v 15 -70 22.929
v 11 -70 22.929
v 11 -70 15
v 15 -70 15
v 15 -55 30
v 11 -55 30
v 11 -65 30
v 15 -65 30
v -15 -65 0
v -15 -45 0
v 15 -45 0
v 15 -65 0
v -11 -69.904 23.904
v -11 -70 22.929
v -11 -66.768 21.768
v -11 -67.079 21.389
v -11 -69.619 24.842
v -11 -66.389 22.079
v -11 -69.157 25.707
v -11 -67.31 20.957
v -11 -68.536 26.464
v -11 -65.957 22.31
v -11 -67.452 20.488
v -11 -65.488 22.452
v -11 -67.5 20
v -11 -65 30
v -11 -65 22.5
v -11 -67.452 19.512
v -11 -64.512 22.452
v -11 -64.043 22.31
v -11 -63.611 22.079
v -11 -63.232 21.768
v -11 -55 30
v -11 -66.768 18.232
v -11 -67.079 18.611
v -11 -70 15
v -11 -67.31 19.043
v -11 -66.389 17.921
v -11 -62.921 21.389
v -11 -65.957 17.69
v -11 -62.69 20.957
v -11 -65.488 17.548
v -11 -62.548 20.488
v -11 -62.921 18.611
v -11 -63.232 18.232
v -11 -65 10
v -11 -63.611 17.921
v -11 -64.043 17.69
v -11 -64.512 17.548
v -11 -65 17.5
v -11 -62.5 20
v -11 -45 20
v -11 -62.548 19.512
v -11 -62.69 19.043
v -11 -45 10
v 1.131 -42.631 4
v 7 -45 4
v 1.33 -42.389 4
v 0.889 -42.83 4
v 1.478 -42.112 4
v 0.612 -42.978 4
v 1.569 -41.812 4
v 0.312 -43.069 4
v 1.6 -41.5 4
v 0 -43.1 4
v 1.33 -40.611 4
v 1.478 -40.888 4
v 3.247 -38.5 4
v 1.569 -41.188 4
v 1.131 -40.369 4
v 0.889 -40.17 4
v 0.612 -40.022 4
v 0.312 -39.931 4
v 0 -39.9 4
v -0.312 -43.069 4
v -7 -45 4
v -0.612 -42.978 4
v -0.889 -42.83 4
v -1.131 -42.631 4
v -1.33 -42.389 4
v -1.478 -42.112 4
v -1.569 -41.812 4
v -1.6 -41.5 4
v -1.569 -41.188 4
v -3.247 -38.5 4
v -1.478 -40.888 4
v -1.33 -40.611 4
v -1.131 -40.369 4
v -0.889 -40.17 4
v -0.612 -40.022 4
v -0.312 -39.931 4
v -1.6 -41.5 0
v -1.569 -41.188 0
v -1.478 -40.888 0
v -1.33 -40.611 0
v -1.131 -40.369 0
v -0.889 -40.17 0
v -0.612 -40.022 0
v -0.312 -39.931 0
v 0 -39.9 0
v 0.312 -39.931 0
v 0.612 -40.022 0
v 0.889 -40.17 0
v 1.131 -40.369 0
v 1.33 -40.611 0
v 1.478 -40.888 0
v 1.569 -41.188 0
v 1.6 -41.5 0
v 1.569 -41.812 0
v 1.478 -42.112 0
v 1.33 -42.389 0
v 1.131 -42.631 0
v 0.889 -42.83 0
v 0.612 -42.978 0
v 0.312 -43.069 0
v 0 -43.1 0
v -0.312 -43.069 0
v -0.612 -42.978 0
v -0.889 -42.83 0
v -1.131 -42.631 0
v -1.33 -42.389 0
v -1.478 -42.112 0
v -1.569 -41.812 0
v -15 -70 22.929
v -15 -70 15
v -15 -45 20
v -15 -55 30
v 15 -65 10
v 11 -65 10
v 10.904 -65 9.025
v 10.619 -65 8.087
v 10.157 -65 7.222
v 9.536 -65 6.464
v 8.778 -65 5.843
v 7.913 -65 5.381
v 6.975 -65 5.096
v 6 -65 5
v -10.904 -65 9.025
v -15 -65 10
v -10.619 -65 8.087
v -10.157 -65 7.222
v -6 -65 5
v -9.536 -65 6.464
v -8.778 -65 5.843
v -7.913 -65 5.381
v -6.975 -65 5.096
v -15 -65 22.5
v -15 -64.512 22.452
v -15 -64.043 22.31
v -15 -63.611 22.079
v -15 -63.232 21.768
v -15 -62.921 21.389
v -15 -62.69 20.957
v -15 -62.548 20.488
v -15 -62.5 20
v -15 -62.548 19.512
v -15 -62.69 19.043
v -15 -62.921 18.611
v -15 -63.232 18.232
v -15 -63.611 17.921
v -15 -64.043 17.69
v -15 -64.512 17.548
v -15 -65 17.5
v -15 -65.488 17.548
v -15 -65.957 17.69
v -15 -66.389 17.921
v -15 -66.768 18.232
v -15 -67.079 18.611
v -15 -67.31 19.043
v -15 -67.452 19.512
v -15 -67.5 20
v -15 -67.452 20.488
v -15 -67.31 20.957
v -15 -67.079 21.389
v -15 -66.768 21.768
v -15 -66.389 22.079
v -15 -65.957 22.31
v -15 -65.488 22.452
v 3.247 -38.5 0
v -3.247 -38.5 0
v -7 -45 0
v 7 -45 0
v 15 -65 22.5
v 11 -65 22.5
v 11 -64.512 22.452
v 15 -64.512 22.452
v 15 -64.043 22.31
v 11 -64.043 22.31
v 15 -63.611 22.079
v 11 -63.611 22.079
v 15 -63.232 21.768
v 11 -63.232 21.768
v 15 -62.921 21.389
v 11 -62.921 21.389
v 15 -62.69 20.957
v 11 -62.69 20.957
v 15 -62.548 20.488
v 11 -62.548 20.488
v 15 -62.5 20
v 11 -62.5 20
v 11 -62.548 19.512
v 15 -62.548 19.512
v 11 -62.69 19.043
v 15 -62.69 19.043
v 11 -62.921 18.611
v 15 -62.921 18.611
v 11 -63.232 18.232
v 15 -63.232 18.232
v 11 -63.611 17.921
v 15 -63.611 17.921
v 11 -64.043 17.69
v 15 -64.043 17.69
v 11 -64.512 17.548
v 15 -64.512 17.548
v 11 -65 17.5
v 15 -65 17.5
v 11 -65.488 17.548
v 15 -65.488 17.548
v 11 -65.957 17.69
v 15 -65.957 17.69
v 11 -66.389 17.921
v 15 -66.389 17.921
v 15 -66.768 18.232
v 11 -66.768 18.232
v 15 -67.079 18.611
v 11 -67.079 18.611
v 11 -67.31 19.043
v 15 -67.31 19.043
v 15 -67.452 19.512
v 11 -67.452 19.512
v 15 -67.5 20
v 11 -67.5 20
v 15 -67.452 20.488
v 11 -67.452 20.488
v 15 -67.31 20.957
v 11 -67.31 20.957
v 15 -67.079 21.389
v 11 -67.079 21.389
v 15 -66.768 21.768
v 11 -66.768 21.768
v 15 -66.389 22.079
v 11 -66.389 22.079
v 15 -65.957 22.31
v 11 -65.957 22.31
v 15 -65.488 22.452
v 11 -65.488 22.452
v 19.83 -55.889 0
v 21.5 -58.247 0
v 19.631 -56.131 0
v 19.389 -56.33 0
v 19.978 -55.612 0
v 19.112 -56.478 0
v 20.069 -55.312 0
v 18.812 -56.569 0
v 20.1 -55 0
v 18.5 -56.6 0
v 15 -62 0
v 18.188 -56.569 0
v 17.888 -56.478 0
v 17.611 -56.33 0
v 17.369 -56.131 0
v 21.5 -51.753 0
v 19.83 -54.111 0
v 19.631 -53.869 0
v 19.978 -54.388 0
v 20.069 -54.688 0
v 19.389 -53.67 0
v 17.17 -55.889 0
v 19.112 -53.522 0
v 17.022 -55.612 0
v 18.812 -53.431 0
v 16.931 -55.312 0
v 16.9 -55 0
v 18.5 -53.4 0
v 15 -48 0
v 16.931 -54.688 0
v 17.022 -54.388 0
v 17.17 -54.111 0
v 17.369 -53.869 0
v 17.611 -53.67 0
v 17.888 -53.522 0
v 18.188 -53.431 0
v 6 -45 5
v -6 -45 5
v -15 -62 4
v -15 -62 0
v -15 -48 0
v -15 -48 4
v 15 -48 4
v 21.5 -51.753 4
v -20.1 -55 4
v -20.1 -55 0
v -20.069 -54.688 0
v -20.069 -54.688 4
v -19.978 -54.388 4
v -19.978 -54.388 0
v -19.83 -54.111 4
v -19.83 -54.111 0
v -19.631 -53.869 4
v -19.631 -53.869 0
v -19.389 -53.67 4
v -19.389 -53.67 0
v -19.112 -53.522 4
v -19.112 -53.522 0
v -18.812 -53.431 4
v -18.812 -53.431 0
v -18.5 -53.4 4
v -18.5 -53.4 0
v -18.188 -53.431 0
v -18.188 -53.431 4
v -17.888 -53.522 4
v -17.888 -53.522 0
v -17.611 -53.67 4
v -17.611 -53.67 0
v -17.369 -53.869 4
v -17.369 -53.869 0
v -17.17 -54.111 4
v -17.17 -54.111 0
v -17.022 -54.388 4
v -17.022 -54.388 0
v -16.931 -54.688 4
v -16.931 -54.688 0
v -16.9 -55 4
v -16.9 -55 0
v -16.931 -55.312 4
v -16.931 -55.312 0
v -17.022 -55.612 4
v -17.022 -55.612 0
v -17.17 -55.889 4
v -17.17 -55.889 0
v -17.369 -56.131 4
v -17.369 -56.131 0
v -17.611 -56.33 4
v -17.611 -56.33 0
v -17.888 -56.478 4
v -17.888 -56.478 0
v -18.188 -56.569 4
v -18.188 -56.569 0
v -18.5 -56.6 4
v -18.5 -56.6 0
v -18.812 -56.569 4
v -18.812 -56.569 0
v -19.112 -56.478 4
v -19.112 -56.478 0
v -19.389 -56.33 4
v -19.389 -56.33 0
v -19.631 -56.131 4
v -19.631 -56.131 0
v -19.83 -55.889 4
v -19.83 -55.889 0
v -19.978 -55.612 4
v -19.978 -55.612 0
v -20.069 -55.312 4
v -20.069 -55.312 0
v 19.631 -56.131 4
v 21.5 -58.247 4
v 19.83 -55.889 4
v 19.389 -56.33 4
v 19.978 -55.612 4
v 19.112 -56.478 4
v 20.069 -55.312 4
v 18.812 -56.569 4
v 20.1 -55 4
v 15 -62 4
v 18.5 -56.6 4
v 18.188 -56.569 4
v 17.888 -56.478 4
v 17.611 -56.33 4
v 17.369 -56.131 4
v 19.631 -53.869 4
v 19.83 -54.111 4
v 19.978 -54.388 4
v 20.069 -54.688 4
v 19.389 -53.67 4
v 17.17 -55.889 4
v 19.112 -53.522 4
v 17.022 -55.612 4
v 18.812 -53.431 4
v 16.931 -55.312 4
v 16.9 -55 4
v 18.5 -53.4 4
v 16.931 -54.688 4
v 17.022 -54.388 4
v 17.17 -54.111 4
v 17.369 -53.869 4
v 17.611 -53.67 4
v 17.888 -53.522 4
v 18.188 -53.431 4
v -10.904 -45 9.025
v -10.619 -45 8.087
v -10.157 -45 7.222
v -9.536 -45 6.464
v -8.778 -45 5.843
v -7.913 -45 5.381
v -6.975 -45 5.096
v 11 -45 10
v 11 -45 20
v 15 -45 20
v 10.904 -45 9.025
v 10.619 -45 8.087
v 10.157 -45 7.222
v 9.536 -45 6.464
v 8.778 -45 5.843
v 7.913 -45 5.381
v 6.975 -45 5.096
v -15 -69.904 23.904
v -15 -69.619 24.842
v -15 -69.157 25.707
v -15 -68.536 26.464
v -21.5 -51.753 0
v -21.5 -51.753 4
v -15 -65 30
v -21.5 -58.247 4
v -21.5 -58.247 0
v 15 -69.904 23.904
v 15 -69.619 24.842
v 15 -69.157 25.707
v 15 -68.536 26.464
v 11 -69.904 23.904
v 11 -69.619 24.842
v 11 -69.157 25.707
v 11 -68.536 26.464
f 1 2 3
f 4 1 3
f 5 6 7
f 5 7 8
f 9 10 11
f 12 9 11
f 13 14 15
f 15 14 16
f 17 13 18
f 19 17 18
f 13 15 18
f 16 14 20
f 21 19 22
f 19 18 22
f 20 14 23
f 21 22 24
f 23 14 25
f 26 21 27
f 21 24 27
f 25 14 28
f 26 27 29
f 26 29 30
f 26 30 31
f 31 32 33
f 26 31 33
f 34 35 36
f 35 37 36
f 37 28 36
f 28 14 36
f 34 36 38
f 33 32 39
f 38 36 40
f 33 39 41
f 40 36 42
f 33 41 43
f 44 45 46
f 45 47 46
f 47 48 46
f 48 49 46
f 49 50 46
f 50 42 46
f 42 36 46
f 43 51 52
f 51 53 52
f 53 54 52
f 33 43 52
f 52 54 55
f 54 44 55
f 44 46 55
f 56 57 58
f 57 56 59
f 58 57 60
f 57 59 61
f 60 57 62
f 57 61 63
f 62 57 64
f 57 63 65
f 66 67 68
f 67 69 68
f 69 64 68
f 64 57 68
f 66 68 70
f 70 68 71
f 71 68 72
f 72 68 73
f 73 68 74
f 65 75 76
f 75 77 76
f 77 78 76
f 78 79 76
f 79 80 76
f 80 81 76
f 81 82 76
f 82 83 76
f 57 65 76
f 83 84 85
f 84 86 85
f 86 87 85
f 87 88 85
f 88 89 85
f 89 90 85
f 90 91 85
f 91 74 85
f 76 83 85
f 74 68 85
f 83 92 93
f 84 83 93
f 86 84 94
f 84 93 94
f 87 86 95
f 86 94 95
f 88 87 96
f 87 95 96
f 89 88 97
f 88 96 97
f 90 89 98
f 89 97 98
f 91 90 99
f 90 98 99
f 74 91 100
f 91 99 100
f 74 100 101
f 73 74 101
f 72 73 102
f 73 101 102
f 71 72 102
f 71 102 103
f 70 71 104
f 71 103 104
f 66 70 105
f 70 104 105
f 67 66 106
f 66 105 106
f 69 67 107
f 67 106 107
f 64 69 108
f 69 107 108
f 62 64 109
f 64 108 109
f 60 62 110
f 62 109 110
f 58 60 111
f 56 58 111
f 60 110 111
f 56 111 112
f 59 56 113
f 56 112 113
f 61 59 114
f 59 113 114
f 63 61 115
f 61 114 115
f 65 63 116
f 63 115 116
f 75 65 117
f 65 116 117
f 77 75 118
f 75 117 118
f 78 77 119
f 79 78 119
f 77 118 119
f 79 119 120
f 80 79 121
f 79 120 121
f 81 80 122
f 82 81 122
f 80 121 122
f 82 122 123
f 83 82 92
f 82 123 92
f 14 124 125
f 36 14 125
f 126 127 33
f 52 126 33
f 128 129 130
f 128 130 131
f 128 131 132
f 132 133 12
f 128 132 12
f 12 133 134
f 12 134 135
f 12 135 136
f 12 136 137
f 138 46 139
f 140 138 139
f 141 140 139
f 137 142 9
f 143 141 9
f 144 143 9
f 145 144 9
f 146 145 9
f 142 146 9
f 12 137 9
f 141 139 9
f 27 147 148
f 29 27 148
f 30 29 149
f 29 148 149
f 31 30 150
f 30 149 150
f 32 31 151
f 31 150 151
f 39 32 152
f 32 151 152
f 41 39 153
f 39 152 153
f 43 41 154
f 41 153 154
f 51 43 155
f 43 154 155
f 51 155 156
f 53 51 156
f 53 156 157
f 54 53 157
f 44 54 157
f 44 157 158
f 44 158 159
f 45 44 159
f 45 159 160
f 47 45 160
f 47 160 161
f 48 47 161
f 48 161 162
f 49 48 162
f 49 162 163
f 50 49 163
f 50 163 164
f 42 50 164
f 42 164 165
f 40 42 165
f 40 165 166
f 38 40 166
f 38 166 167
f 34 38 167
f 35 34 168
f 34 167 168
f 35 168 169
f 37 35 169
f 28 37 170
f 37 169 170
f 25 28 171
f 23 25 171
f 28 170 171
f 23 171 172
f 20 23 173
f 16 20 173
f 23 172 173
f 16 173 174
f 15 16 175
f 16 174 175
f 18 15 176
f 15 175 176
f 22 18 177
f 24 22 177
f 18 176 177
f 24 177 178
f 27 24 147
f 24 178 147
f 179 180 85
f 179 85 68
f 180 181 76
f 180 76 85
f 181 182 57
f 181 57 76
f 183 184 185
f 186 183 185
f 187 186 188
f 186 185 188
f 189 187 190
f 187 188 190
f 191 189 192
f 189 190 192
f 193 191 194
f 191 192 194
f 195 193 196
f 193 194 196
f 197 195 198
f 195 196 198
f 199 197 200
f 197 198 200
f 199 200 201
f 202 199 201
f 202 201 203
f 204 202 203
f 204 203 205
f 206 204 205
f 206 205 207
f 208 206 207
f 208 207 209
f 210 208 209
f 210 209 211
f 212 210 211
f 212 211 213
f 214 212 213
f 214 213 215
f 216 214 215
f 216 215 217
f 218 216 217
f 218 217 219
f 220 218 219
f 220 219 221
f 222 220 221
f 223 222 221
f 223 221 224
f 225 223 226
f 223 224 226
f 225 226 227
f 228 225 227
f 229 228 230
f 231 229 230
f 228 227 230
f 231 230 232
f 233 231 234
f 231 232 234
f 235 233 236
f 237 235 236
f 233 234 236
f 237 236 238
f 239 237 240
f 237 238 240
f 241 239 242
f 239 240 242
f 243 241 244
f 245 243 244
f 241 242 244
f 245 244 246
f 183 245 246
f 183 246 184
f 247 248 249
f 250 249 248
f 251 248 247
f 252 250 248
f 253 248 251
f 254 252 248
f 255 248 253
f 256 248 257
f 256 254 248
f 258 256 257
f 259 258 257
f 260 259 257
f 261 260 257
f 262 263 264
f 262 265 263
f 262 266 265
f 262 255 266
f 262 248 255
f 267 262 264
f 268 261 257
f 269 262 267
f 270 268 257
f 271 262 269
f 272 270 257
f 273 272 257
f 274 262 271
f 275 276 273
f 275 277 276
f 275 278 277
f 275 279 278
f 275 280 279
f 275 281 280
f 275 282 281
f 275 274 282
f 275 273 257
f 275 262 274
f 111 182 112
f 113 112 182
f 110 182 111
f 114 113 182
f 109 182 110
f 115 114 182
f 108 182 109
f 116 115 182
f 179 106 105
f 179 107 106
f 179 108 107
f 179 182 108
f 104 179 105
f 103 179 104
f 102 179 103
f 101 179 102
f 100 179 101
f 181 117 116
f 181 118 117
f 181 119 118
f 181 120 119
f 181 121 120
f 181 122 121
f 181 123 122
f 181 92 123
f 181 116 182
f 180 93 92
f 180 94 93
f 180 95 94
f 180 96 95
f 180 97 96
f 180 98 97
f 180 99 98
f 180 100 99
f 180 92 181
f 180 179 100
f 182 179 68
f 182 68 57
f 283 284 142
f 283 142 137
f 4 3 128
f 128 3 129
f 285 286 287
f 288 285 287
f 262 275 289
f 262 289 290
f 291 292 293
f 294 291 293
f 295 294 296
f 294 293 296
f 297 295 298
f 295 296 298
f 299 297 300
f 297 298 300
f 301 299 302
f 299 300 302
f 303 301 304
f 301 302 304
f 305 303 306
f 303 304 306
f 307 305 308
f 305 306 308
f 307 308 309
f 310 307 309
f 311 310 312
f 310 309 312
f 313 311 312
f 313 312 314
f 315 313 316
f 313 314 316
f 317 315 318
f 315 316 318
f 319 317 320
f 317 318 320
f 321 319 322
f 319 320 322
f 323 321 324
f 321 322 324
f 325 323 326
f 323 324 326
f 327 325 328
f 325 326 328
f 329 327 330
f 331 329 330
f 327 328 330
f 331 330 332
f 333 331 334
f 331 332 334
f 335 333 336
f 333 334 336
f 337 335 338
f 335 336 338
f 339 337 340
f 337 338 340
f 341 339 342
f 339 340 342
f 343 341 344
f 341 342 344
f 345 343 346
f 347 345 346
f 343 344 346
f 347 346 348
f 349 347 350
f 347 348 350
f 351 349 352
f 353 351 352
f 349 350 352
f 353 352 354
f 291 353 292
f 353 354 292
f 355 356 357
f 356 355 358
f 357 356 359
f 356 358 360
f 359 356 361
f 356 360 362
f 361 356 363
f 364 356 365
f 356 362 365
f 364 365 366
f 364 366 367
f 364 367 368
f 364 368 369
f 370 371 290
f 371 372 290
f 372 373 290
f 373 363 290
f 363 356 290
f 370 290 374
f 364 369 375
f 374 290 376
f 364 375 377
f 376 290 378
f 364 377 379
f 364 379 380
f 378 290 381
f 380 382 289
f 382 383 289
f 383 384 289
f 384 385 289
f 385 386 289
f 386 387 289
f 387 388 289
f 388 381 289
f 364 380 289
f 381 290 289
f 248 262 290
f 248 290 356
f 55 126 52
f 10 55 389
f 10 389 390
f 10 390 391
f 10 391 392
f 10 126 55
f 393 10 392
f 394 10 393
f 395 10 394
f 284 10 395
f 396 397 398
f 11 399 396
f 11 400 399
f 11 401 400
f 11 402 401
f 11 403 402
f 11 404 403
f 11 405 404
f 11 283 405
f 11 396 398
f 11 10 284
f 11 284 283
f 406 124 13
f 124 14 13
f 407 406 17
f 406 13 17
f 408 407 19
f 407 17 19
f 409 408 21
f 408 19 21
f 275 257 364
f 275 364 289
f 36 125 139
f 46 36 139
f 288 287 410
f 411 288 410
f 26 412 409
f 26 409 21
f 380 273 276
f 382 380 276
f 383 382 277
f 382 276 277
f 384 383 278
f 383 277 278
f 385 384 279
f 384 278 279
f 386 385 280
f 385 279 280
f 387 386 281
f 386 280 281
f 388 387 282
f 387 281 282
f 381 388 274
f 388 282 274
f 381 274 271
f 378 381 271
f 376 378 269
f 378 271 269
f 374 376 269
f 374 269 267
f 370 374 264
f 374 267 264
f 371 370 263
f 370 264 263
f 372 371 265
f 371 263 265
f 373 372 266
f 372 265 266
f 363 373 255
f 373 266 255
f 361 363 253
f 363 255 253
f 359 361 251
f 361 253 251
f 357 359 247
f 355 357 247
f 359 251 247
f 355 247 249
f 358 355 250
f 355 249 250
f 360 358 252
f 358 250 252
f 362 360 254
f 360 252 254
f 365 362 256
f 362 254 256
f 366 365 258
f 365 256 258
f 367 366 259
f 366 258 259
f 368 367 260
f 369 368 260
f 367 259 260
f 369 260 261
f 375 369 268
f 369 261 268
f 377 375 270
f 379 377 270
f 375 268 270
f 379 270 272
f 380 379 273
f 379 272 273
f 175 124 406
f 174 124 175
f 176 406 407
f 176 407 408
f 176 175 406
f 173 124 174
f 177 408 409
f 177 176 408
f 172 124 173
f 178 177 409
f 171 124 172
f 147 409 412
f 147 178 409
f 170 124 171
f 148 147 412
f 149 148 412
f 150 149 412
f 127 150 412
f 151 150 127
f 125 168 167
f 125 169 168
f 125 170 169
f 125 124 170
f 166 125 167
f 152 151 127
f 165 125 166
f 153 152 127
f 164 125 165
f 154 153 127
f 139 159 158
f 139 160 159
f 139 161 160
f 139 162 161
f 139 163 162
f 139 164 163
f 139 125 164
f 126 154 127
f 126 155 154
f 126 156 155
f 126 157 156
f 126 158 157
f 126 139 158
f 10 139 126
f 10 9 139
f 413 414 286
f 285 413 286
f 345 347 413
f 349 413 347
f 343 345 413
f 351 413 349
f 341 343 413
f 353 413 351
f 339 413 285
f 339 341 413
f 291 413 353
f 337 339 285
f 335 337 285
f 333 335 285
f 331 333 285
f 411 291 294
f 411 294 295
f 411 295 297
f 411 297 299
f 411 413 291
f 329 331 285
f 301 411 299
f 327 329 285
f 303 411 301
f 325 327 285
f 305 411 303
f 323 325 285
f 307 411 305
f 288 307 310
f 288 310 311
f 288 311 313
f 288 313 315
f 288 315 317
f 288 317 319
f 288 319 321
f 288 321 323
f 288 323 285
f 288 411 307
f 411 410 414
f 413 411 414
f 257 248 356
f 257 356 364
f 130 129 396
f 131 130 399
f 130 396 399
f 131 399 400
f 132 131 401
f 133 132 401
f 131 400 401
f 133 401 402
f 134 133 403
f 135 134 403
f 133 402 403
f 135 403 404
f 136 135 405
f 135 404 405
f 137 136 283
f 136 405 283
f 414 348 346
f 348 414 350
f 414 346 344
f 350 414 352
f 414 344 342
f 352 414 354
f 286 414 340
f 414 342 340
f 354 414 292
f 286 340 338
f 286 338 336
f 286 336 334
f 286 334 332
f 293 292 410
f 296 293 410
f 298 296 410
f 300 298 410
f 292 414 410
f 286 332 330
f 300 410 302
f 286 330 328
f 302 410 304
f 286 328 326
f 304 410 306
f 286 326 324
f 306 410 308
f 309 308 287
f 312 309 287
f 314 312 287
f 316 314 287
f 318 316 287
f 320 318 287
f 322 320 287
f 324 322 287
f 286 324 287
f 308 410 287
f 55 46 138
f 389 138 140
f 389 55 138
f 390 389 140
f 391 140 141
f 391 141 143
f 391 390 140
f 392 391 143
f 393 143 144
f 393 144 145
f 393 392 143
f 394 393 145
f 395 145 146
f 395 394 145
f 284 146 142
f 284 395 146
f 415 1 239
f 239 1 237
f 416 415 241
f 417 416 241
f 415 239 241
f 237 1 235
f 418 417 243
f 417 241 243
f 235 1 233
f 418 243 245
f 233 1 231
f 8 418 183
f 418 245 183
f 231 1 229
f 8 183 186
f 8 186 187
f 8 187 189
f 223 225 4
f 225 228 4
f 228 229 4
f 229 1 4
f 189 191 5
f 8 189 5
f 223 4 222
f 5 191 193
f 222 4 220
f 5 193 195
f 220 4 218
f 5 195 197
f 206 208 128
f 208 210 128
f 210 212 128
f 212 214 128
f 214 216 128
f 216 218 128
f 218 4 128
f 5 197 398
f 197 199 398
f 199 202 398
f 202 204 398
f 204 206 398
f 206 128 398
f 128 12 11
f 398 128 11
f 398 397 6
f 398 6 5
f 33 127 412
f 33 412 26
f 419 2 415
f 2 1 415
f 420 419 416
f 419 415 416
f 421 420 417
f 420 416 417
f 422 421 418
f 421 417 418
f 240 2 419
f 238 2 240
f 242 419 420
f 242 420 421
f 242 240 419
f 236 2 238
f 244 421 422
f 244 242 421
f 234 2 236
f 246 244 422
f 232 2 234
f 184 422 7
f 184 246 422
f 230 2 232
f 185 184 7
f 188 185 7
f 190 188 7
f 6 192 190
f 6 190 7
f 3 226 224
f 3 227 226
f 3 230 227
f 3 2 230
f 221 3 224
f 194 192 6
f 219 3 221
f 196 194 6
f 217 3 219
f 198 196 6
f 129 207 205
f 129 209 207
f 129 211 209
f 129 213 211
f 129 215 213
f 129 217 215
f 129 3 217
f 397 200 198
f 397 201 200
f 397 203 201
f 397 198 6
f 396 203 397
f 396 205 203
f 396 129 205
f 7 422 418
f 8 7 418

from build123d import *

# Parameters (mm, degrees)
SKETCH1_W             = 30
SKETCH1_H             = 40
BOSS_EXTRUDE1_DEPTH   = 5
SKETCH2_W             = 4
SKETCH2_H             = 40
BOSS_EXTRUDE2_DEPTH   = 25
CHAMFER1_SIZE         = 10
SKETCH3_R             = 2.5
CUT_EXTRUDE1_DEPTH    = 76
CUT_EXTRUDE2_DEPTH    = 76
CHAMFER2_SIZE         = 5
FILLET1_R             = 5
FILLET2_R             = 5
SKETCH5_R             = 1.6
BOSS_EXTRUDE3_DEPTH   = 4
BOSS_EXTRUDE3_2_DEPTH = 4
BOSS_EXTRUDE3_3_DEPTH = 4


with BuildPart() as part:
    # Sketch1 → Boss-Extrude1 (new body)
    with BuildSketch(Plane.XY):
        with Locations((0, -65)):
            Rectangle(SKETCH1_W, SKETCH1_H)
    extrude(amount=BOSS_EXTRUDE1_DEPTH)

    # Sketch2 → Boss-Extrude2 (add)
    with BuildSketch(Plane.XY.offset(5)):
        with Locations((-13, -65)):
            Rectangle(SKETCH2_W, SKETCH2_H)
        with Locations((13, -65)):
            Rectangle(SKETCH2_W, SKETCH2_H)
    extrude(amount=BOSS_EXTRUDE2_DEPTH)

    # Chamfer1
    chamfer1_edges = [part.edges().sort_by_distance(p)[0] for p in [
        (-13, -85, 30),
        (-13, -45, 30),
        (13, -45, 30),
        (13, -85, 30),
    ]]
    chamfer(chamfer1_edges, length=CHAMFER1_SIZE)

    # Sketch3 → Cut-Extrude1 (cut)
    with BuildSketch(Plane.ZY.offset(15)):
        with Locations((20, -65)):
            Circle(SKETCH3_R)
    extrude(amount=-CUT_EXTRUDE1_DEPTH, mode=Mode.SUBTRACT)

    # Sketch4 → Cut-Extrude2 (cut)
    with BuildSketch(Plane.ZY.offset(15)):
        Polygon((30, -70), (15, -70), (10, -65), (0, -65), (-4.906165795, -89.804855258), (31.217938956, -87.25505427), align=None)
    extrude(amount=-CUT_EXTRUDE2_DEPTH, mode=Mode.SUBTRACT)

    # Chamfer2
    chamfer2_edges = [part.edges().sort_by_distance(p)[0] for p in [
        (13, -70, 30),
        (-13, -70, 30),
    ]]
    chamfer(chamfer2_edges, length=CHAMFER2_SIZE)

    # Fillet1
    fillet1_edges = [part.edges().sort_by_distance(p)[0] for p in [
        (11, -55, 5),
        (-11, -55, 5),
    ]]
    fillet(fillet1_edges, radius=FILLET1_R)

    # Fillet2
    fillet2_edges = [part.edges().sort_by_distance(p)[0] for p in [
        (-13, -70, 25),
        (13, -70, 25),
    ]]
    fillet(fillet2_edges, radius=FILLET2_R)


with BuildPart() as body_2:
    # Sketch5 → Boss-Extrude3 (new body)
    with BuildSketch(Plane(origin=(0, 0, 0), x_dir=(-1, 0, 0), z_dir=(0, 0, -1))):
        Polygon((7, -45), (3.24722325, -38.5), (-3.24722325, -38.5), (-7, -45), align=None)
        with Locations((0, -41.5)):
            Circle(SKETCH5_R, mode=Mode.SUBTRACT)
    extrude(amount=-BOSS_EXTRUDE3_DEPTH)


with BuildPart() as body_3:
    # Sketch5 → Boss-Extrude3 2 (new body)
    with BuildSketch(Plane(origin=(0, 0, 0), x_dir=(-1, 0, 0), z_dir=(0, 0, -1))):
        Polygon((15, -48), (21.5, -51.75277675), (21.5, -58.24722325), (15, -62), align=None)
        with Locations((18.5, -55)):
            Circle(SKETCH5_R, mode=Mode.SUBTRACT)
    extrude(amount=-BOSS_EXTRUDE3_2_DEPTH)


with BuildPart() as body_4:
    # Sketch5 → Boss-Extrude3 3 (new body)
    with BuildSketch(Plane(origin=(0, 0, 0), x_dir=(-1, 0, 0), z_dir=(0, 0, -1))):
        Polygon((-15, -62), (-15, -48), (-21.5, -51.75277675), (-21.5, -58.24722325), align=None)
        with Locations((-18.5, -55)):
            Circle(SKETCH5_R, mode=Mode.SUBTRACT)
    extrude(amount=-BOSS_EXTRUDE3_3_DEPTH)


solid = Compound([part.part, body_2.part, body_3.part, body_4.part])
